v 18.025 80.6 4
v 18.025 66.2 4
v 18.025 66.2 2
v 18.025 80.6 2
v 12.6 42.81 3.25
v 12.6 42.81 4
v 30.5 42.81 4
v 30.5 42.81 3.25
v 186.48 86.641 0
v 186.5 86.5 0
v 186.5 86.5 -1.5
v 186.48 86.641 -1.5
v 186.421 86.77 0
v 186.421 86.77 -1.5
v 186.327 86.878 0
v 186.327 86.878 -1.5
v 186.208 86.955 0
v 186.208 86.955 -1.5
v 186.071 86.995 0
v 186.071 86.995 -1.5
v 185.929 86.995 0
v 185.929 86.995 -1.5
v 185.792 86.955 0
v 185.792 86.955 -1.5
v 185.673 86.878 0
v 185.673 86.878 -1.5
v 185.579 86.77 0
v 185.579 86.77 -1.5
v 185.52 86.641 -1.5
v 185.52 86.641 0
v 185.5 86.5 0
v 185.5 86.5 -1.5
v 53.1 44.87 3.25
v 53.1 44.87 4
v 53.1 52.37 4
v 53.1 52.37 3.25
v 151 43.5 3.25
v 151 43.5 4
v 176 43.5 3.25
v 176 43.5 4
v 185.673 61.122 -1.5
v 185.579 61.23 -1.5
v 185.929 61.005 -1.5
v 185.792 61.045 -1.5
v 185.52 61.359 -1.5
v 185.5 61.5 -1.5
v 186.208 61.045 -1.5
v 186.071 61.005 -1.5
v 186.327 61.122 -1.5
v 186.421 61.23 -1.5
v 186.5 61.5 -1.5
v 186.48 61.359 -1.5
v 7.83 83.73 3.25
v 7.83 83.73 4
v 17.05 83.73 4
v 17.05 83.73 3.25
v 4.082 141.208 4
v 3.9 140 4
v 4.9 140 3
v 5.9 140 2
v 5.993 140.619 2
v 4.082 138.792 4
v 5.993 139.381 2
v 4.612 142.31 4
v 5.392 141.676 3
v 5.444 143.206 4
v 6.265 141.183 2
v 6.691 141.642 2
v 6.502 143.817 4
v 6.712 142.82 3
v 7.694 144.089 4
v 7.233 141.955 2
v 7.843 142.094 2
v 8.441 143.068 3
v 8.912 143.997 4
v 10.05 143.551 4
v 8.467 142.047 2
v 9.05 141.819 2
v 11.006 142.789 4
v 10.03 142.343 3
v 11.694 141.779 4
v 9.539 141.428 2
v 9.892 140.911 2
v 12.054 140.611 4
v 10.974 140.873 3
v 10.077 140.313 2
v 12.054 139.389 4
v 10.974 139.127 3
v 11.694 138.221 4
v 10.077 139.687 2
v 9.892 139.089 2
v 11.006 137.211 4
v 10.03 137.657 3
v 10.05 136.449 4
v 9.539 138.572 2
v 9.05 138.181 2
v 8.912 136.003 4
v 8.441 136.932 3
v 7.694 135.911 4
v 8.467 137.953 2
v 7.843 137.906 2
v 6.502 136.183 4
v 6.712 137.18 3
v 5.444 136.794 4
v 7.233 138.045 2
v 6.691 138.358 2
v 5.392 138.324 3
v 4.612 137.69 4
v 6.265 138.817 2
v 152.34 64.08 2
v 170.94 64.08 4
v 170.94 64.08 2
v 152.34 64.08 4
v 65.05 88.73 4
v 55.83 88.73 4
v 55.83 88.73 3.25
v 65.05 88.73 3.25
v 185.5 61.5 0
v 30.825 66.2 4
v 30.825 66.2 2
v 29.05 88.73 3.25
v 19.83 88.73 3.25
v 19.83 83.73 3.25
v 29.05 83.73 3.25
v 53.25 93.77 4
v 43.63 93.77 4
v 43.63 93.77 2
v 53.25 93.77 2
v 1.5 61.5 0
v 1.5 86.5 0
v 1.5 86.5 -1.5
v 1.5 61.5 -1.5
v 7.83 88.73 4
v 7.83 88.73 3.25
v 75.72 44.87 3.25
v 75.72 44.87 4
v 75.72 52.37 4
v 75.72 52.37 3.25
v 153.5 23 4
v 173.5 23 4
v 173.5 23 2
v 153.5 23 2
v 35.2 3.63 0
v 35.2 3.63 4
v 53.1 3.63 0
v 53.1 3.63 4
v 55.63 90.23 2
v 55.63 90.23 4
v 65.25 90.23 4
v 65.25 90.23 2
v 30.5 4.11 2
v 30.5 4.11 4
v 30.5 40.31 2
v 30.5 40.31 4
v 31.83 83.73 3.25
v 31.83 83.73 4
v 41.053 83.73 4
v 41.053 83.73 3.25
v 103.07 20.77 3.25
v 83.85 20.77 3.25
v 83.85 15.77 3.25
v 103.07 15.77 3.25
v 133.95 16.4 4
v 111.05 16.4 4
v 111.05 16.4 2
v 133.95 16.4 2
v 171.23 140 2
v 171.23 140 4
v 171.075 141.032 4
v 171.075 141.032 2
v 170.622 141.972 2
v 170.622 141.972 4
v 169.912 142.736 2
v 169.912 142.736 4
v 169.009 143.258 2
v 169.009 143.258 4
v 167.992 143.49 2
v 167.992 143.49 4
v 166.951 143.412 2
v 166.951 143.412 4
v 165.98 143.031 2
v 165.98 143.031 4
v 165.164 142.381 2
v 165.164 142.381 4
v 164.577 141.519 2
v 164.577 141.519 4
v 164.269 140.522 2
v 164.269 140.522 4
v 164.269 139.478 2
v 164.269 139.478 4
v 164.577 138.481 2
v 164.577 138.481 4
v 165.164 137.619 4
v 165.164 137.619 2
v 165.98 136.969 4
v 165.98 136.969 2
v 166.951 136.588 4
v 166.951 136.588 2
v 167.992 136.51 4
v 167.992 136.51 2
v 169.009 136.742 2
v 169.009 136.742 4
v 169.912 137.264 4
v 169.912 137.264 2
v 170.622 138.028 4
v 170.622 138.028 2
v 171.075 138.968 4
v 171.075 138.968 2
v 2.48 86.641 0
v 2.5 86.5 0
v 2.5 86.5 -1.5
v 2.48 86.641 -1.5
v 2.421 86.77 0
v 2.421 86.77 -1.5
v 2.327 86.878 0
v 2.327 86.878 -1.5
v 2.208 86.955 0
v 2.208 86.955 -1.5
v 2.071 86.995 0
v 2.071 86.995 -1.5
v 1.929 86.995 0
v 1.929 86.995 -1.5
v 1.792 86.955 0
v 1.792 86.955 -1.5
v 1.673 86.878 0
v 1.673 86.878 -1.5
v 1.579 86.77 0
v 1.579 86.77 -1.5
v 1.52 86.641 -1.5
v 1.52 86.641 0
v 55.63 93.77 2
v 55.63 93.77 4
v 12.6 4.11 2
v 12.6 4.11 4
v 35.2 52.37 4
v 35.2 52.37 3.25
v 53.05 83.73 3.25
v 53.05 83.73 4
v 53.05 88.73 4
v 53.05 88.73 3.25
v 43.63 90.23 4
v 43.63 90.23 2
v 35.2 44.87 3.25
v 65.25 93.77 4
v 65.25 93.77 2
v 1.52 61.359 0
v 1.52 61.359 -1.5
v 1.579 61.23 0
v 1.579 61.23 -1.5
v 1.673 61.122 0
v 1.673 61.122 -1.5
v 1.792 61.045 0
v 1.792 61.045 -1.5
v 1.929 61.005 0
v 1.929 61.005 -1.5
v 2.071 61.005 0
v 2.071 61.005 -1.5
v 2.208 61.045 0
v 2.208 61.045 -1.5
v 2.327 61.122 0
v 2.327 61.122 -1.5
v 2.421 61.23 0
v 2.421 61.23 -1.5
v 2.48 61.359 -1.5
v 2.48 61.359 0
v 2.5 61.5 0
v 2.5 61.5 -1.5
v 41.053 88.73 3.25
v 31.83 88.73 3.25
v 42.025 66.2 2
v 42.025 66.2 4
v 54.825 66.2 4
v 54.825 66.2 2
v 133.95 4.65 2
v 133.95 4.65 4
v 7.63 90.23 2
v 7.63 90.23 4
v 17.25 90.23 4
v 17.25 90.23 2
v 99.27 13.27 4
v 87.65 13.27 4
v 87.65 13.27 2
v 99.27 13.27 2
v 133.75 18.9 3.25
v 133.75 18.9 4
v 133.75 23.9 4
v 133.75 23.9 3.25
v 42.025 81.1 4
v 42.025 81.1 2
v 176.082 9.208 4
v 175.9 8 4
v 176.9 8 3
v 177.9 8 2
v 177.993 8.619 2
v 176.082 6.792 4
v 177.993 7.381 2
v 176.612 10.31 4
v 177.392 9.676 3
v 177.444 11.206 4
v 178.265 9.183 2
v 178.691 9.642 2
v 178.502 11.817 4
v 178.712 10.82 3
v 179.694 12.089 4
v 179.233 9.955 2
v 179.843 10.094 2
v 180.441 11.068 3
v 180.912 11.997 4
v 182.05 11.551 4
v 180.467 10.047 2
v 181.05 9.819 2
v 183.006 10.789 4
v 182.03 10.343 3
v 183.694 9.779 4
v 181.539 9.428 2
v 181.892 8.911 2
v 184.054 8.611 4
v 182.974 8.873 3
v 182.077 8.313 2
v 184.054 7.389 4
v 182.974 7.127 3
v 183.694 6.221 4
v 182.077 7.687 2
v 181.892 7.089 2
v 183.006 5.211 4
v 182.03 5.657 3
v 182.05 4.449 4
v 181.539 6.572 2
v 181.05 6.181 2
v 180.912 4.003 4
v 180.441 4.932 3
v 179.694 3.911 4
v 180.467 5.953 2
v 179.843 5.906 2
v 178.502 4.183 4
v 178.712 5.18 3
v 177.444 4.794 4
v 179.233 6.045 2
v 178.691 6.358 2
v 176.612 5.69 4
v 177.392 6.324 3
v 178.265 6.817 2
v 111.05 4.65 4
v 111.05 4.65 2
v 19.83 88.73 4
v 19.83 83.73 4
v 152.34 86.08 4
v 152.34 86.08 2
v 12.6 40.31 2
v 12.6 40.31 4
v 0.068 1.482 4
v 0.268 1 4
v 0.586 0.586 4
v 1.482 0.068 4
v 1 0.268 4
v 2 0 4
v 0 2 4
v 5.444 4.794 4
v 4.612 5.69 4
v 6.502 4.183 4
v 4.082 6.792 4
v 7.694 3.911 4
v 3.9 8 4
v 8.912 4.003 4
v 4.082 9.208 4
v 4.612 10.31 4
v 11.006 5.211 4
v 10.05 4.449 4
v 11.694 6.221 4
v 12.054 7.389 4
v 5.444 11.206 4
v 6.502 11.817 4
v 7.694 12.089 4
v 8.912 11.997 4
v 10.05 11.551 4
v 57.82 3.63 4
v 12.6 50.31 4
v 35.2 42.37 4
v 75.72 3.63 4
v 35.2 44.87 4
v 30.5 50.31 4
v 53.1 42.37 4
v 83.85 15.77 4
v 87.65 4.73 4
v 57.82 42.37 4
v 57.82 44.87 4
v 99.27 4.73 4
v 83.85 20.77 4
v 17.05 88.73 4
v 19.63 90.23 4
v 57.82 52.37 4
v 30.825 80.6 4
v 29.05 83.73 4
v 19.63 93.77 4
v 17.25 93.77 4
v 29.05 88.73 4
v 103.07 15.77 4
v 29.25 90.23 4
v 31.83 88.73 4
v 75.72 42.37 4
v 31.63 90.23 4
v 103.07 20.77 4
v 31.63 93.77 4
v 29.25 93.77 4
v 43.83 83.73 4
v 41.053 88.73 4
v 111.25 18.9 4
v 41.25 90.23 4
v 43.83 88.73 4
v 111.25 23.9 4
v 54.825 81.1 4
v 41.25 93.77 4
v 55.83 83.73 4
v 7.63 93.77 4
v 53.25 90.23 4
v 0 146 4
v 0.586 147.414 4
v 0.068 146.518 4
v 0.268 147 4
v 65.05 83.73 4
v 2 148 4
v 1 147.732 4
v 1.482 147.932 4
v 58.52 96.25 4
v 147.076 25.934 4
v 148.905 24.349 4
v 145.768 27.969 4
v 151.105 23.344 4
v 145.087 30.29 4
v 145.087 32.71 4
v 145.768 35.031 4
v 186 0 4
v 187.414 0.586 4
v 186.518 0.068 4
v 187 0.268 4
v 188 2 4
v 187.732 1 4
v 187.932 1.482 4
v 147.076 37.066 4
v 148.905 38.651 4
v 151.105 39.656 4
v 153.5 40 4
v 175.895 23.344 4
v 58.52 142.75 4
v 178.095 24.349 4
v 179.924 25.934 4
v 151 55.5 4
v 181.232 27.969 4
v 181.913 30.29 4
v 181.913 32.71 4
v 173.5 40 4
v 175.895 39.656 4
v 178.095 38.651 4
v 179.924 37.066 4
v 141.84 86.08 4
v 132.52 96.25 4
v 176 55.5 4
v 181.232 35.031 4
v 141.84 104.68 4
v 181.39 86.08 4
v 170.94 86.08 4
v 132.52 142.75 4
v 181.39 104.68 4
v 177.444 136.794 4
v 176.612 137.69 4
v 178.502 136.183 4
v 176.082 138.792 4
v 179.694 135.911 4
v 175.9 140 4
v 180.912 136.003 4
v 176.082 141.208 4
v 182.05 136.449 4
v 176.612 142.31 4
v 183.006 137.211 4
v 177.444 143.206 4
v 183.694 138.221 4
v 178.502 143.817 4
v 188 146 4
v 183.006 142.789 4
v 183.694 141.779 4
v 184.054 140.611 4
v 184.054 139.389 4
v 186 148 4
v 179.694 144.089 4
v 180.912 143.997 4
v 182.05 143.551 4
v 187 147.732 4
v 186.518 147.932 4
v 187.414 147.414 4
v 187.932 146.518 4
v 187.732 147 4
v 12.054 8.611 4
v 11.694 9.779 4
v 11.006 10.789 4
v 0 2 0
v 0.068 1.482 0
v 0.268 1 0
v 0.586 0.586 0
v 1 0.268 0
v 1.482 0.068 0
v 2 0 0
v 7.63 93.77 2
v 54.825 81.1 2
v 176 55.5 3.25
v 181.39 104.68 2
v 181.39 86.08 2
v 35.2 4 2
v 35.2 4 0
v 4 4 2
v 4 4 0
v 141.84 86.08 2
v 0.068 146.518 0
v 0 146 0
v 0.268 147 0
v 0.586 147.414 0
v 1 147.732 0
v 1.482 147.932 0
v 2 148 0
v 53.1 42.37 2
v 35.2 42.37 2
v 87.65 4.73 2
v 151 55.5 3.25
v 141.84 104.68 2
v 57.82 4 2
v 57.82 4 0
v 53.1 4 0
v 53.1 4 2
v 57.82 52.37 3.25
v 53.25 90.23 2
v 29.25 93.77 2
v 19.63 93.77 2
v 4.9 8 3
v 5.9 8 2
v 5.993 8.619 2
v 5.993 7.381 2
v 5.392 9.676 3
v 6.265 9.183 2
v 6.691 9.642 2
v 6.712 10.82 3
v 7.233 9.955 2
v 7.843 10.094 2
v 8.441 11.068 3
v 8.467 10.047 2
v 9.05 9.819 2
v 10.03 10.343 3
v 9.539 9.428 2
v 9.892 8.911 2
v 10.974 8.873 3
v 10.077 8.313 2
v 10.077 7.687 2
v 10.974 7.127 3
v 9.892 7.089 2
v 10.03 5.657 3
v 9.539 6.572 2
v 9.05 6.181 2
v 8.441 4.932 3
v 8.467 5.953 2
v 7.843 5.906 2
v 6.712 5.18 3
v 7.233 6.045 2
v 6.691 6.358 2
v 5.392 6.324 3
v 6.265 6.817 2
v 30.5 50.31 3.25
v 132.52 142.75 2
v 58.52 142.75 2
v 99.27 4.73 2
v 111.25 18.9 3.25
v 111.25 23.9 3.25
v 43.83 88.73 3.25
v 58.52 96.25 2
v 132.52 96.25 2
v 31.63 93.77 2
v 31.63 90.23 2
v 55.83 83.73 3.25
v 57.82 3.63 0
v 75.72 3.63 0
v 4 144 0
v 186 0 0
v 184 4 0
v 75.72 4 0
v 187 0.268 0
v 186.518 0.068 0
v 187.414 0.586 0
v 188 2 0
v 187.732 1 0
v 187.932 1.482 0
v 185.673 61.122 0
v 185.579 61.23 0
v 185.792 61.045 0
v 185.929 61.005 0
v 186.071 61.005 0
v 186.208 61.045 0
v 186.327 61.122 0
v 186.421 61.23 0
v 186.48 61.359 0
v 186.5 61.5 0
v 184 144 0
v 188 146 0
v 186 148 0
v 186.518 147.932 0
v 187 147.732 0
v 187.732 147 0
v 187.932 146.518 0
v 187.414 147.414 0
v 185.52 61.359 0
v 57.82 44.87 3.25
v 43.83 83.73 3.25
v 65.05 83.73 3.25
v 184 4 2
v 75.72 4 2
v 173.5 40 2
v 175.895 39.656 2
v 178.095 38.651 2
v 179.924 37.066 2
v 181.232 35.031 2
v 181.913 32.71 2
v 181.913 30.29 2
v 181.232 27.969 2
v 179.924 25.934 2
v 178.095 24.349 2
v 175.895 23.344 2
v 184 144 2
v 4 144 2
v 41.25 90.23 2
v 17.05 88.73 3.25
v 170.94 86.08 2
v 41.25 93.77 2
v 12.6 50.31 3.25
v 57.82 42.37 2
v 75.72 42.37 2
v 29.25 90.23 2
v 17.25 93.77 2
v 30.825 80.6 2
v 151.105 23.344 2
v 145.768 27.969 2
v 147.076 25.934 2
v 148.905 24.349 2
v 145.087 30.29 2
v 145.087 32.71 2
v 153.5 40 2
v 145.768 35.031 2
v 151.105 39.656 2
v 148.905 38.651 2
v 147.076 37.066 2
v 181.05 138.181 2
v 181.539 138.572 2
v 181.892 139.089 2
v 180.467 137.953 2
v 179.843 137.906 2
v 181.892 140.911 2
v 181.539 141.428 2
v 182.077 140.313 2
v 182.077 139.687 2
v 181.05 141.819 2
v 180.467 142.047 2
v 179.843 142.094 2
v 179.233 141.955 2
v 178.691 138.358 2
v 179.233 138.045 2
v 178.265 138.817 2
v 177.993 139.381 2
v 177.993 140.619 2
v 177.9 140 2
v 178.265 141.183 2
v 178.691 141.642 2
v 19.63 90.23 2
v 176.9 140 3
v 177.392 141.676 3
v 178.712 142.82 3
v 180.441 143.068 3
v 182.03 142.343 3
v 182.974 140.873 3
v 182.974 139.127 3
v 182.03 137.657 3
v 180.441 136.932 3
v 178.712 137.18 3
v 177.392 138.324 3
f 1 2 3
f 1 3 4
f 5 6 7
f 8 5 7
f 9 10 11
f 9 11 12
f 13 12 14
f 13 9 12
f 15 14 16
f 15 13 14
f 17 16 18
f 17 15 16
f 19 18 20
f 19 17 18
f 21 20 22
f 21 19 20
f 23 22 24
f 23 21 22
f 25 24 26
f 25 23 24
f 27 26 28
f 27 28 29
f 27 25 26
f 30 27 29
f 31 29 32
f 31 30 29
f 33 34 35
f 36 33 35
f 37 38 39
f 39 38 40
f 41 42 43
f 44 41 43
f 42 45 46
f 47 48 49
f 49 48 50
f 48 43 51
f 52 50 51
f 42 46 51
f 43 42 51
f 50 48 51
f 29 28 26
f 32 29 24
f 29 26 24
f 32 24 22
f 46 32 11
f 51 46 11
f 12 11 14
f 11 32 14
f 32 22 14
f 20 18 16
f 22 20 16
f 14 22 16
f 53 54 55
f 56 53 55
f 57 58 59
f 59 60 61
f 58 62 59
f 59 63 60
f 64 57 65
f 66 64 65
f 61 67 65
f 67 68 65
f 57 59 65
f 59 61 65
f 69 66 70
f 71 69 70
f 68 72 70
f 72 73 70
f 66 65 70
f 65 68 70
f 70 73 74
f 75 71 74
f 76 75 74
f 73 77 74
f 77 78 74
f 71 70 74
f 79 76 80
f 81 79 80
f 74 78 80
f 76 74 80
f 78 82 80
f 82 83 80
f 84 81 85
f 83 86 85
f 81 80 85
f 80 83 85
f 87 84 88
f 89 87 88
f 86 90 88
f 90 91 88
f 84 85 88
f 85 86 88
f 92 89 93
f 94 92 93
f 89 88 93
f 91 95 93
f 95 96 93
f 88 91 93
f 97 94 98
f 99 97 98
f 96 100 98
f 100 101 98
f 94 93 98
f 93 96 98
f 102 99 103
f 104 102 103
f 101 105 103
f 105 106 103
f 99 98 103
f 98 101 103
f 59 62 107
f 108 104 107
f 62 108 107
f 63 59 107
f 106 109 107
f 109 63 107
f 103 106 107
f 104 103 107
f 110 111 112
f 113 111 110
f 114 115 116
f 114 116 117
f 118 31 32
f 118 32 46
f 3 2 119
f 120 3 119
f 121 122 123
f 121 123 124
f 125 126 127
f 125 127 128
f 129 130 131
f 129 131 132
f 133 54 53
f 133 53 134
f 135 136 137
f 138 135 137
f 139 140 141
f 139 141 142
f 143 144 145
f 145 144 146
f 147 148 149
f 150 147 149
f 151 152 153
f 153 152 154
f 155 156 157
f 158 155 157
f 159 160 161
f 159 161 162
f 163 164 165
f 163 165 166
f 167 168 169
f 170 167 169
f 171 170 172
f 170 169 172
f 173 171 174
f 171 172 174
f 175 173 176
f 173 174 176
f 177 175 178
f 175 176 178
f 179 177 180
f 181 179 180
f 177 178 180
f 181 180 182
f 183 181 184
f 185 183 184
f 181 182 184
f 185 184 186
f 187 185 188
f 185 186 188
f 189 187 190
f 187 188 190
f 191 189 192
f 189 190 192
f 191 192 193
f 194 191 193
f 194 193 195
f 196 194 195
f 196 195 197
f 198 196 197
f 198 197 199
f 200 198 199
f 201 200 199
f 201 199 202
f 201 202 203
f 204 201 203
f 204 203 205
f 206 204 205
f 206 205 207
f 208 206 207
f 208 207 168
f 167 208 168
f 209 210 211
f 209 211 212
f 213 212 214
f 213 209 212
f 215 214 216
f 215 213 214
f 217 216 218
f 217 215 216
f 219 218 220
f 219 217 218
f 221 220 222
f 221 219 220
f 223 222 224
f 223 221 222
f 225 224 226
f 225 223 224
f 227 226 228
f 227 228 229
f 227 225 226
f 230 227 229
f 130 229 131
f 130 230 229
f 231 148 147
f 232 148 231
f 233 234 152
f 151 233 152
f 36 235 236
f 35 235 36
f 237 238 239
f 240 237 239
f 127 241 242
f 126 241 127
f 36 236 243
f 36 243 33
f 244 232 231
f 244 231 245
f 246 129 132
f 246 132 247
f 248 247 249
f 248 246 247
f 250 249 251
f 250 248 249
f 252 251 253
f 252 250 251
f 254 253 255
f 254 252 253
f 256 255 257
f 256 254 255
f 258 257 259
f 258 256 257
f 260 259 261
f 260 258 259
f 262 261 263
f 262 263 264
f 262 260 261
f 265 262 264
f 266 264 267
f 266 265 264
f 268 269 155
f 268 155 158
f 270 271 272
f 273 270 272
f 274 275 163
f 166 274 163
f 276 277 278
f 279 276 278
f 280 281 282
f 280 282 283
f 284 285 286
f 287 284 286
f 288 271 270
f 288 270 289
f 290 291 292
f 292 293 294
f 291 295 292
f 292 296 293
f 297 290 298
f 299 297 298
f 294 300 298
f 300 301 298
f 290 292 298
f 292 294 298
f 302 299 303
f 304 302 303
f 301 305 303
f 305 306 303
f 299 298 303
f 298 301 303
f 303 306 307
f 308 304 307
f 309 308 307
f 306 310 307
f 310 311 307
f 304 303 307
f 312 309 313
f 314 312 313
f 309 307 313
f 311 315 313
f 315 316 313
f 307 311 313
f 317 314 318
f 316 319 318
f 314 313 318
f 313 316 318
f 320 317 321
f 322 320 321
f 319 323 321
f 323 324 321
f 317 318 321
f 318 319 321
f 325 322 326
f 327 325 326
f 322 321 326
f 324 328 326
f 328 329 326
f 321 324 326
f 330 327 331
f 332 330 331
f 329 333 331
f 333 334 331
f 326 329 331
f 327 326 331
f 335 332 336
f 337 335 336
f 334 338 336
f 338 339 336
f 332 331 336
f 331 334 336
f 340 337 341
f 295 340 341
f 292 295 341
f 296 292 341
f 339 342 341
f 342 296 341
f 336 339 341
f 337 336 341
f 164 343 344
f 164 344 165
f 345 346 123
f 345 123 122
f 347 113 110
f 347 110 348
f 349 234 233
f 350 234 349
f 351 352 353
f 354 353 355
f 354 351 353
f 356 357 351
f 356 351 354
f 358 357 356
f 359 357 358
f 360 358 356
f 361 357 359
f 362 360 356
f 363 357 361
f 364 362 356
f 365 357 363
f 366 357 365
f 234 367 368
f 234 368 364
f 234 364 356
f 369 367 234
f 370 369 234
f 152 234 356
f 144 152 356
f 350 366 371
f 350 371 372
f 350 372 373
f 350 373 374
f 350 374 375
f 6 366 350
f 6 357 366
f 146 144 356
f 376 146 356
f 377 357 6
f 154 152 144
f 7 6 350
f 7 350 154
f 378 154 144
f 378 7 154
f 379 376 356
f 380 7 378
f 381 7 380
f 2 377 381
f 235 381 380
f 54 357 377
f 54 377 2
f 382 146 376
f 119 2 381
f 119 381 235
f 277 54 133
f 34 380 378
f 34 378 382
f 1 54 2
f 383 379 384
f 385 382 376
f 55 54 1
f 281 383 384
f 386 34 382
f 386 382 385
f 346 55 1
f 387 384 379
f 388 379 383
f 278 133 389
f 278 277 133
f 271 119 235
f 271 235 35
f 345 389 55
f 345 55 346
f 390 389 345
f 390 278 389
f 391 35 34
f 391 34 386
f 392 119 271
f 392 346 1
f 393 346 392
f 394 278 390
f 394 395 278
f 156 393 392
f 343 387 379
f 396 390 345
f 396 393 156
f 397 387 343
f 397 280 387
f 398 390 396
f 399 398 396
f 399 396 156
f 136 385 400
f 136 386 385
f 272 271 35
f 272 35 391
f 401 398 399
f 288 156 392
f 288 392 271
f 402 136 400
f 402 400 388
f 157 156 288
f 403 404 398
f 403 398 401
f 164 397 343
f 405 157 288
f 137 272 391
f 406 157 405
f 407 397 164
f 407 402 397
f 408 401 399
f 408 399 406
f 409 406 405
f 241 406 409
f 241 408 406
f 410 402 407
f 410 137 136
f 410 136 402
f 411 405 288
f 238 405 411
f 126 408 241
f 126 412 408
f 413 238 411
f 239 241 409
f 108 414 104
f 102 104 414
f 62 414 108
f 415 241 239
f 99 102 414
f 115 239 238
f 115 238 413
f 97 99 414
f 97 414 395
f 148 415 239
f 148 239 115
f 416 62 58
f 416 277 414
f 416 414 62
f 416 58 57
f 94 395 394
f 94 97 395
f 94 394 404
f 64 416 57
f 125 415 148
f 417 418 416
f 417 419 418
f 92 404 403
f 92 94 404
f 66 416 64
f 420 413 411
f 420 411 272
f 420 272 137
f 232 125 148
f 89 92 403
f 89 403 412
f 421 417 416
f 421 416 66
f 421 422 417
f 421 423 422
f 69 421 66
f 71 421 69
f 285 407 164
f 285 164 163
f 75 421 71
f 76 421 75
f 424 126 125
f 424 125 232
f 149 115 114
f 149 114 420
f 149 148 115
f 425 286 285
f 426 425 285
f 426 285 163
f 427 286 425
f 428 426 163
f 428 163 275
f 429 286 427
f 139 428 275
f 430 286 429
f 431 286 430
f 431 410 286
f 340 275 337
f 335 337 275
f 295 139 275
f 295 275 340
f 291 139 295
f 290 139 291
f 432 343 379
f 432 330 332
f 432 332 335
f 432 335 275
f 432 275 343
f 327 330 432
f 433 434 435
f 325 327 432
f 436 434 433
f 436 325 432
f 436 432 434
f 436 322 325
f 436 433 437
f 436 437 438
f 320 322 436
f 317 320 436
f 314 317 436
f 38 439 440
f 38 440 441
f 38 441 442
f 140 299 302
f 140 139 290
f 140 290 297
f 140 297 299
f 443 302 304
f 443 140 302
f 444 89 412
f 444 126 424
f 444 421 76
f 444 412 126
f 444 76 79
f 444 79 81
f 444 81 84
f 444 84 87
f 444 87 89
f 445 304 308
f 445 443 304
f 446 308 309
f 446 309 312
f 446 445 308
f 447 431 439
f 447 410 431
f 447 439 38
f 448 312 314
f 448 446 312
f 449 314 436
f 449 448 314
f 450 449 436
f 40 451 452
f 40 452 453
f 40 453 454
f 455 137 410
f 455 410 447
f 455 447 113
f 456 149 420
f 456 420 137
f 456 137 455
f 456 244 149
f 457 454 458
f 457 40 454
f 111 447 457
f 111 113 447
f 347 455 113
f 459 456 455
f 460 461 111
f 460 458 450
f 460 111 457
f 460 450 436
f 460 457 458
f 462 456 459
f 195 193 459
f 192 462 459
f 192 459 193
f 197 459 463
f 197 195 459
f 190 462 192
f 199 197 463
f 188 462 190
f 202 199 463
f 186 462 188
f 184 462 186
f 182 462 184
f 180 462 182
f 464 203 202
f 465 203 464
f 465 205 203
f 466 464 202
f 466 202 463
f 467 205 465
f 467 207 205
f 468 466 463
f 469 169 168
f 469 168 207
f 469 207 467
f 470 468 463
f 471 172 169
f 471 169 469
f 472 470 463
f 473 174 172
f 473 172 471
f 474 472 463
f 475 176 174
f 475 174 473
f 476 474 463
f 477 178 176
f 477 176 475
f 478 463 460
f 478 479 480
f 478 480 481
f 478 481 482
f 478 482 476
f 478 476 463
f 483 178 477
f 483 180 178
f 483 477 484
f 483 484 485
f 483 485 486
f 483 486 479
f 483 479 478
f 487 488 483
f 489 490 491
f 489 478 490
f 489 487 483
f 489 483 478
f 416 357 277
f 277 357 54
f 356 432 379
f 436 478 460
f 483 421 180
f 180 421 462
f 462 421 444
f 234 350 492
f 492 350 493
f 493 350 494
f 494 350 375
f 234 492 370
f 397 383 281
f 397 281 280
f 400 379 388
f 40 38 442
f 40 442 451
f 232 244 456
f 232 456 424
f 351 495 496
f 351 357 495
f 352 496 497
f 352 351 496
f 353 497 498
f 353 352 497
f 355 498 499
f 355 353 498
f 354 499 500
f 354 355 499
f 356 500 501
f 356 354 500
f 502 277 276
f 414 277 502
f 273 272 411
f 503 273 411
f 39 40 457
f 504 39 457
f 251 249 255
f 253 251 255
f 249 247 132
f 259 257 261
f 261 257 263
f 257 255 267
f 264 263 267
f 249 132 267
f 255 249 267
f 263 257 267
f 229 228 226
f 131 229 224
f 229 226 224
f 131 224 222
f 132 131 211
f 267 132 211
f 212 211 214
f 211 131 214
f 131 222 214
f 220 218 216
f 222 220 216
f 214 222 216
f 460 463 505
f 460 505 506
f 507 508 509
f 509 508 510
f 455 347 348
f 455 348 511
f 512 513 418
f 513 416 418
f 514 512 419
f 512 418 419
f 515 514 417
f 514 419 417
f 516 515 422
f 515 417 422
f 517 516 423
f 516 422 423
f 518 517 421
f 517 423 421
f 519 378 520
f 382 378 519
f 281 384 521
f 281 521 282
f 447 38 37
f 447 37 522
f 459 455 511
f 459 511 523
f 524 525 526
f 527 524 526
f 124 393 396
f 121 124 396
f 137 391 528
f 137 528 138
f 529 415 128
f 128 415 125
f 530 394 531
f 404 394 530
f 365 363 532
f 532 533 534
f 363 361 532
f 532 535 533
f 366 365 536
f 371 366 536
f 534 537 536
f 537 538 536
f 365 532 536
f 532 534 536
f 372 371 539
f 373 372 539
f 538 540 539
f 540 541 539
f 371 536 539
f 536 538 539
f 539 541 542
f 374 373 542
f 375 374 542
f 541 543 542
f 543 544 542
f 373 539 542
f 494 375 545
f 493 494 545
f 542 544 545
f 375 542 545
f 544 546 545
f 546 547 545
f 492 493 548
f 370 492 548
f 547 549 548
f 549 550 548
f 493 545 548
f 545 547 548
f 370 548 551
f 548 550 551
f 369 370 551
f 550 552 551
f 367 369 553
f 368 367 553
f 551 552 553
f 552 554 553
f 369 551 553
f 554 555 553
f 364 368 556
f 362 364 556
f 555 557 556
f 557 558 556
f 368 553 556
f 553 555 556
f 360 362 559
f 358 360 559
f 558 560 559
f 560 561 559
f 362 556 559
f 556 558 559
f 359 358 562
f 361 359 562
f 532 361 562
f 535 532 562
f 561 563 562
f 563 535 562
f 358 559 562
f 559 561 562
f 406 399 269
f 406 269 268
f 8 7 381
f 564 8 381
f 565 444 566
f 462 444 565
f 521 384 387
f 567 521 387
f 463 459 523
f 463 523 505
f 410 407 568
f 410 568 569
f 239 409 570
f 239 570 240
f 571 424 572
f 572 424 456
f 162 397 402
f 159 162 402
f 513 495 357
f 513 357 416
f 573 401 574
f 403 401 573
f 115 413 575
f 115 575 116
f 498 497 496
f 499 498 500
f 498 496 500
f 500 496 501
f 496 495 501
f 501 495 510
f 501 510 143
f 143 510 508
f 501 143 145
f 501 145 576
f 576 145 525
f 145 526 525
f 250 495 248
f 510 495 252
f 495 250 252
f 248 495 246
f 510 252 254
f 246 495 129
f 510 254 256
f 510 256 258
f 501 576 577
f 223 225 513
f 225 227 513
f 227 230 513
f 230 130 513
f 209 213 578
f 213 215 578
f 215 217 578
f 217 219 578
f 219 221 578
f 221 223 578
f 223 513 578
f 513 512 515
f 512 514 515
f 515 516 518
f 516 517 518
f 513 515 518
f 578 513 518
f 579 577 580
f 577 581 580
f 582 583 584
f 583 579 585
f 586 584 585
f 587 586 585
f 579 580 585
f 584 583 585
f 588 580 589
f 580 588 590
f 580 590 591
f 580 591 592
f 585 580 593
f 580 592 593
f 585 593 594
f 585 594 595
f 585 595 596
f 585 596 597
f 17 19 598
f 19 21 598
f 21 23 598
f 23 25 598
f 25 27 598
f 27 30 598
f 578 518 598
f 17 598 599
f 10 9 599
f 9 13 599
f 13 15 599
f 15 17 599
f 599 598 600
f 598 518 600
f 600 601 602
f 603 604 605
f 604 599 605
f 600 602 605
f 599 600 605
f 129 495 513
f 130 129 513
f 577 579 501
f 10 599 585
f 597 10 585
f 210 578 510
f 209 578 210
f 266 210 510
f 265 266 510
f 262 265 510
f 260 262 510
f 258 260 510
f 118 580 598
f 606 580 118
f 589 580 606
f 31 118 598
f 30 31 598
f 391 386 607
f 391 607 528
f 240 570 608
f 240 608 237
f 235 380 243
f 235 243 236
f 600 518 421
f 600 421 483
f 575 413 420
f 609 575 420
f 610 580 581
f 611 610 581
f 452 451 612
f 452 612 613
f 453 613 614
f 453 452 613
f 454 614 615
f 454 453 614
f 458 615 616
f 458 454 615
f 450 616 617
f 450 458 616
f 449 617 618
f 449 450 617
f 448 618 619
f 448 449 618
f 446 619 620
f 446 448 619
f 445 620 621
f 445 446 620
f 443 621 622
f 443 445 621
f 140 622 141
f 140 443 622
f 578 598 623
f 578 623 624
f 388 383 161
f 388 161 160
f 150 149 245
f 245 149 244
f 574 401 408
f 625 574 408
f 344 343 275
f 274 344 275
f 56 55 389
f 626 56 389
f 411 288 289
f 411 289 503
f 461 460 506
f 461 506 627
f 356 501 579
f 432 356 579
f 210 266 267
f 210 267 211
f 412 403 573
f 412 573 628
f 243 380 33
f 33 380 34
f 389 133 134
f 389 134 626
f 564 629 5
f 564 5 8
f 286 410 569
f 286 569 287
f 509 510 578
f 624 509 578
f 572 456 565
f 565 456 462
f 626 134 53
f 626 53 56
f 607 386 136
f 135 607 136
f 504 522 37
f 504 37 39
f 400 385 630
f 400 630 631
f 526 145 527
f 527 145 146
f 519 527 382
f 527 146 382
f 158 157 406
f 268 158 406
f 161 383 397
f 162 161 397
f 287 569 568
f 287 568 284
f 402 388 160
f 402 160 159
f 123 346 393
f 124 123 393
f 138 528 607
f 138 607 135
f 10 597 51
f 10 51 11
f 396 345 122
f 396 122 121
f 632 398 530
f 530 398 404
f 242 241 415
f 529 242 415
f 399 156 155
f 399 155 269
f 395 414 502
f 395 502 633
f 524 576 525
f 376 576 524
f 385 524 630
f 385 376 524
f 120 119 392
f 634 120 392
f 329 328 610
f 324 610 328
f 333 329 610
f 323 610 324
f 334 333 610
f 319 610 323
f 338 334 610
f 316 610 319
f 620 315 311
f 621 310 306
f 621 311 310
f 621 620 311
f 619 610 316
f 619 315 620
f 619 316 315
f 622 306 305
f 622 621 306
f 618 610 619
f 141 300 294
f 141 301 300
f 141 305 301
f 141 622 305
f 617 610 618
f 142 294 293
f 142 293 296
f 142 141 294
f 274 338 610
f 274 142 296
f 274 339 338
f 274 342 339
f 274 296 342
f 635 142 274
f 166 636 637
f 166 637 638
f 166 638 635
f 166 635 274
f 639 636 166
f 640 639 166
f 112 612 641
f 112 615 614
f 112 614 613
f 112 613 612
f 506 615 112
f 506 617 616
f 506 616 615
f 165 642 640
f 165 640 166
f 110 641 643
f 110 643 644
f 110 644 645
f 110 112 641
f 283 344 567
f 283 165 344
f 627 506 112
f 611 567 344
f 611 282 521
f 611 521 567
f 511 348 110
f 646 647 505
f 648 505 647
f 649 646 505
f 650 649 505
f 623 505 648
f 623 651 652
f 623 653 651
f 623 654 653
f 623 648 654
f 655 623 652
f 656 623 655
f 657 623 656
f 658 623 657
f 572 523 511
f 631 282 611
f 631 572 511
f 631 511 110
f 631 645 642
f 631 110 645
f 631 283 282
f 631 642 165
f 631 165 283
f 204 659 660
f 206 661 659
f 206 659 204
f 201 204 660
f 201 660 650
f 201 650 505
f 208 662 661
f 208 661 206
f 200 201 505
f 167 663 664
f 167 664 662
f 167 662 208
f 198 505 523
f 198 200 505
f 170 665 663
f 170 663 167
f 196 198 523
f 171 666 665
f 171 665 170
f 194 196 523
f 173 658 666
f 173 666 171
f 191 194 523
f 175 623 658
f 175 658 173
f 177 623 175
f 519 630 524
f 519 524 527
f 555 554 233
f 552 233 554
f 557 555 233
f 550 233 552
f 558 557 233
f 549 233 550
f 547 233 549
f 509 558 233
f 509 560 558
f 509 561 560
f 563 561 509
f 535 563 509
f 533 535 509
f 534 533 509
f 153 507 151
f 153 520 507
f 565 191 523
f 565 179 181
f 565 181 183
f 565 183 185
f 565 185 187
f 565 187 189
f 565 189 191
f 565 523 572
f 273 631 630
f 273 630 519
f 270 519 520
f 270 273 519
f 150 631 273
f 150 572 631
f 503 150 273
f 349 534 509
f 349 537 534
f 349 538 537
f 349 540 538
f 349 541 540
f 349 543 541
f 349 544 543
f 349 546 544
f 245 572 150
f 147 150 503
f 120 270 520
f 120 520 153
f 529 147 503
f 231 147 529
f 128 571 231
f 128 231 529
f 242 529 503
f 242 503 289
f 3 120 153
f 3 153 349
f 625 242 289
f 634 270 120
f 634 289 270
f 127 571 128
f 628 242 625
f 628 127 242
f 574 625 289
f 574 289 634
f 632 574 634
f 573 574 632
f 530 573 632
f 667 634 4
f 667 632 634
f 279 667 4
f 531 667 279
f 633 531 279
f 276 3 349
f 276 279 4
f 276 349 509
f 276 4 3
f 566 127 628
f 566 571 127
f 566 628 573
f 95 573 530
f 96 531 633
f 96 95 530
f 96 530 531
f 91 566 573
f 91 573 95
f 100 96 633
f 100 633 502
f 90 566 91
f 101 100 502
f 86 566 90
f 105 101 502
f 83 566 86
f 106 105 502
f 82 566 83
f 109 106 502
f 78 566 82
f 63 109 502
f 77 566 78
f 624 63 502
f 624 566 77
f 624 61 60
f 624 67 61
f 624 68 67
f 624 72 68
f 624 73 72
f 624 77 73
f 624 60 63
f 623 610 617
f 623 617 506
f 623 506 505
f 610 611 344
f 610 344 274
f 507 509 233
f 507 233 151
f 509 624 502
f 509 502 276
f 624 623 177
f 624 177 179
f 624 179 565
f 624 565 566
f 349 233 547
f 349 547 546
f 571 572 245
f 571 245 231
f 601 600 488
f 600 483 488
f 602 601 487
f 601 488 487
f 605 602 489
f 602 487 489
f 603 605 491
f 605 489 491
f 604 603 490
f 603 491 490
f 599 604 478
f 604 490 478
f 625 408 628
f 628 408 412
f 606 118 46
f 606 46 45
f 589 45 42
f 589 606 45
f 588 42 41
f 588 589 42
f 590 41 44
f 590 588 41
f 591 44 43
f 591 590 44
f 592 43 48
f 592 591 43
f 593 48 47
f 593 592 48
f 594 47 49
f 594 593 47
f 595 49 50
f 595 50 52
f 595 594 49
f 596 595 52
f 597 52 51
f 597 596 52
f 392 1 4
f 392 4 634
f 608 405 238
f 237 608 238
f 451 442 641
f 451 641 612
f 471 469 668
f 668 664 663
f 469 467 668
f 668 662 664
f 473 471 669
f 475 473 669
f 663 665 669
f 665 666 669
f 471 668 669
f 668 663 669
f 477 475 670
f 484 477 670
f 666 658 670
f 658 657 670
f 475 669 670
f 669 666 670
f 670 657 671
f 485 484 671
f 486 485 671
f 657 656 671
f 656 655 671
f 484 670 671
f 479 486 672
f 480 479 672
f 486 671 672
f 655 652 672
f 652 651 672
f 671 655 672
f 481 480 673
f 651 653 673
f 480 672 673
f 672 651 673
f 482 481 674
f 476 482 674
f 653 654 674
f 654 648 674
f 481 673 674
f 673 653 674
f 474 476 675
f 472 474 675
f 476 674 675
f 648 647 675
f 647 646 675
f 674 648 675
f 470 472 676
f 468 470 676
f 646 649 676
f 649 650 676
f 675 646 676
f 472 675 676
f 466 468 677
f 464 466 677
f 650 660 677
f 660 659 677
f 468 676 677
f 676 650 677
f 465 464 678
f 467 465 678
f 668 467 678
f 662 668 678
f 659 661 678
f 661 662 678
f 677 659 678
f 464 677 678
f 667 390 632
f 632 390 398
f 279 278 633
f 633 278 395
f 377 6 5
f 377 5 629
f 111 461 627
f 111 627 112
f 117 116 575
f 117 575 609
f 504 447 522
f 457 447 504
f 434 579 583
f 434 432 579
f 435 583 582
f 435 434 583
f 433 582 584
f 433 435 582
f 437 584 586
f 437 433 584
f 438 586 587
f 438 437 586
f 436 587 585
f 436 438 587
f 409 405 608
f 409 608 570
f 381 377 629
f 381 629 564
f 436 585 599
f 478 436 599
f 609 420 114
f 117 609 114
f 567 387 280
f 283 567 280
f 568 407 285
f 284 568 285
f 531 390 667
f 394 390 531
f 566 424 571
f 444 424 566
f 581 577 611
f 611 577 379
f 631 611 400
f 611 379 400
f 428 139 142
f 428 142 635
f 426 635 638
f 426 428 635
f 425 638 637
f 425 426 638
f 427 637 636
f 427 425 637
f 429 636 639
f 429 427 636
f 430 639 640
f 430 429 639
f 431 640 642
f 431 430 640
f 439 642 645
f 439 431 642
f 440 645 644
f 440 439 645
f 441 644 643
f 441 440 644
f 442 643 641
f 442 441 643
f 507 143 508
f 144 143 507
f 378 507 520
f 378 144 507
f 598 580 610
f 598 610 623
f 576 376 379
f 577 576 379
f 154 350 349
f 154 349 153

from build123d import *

# Parameters (mm, degrees)
CROQUIS1_W              = 188
CROQUIS1_H              = 148
SALIENTE_EXTRUIR1_DEPTH = 4
CROQUIS2_R              = 2.1
CORTAR_EXTRUIR1_DEPTH   = 4
REDONDEO1_R             = 2
CHAFL_N1_SIZE           = 2
CORTAR_EXTRUIR4_REACH   = 6
CROQUIS4_R              = 3.5
CROQUIS4_W              = 17.9
CROQUIS4_H              = 36.2
CROQUIS4_W_2            = 9.62
CROQUIS4_H_2            = 3.54
CROQUIS4_H_3            = 38.74
CROQUIS4_W_3            = 11.62
CROQUIS4_H_4            = 8.54
CROQUIS4_W_4            = 22.9
CROQUIS4_H_5            = 11.75
CROQUIS4_W_5            = 74
CROQUIS4_H_6            = 46.5
CROQUIS4_W_6            = 12.8
CROQUIS4_H_7            = 14.4
CROQUIS4_H_8            = 14.9
CROQUIS5_W              = 180
CROQUIS5_H              = 140
CORTAR_EXTRUIR5_DEPTH   = 2
SALIENTE_EXTRUIR4_DEPTH = 1.5
CROQUIS8_W              = 17.9
CROQUIS8_H              = 7.5
CROQUIS8_W_2            = 19.22
CROQUIS8_H_2            = 5
CROQUIS8_W_3            = 22.5
CROQUIS8_W_4            = 25
CROQUIS8_H_3            = 12
CROQUIS8_W_5            = 9.22
CROQUIS8_W_6            = 9.222831243
CORTAR_EXTRUIR6_DEPTH   = 0.75


with BuildPart() as part:
    # Croquis1 → Saliente-Extruir1 (new body)
    with BuildSketch(Plane.XY):
        with Locations((94, 74)):
            Rectangle(CROQUIS1_W, CROQUIS1_H)
    extrude(amount=SALIENTE_EXTRUIR1_DEPTH)

    # Croquis2 → Cortar-Extruir1 (cut)
    with BuildSketch(Plane(origin=(0, 0, 0), x_dir=(-1, 0, 0), z_dir=(0, 0, -1))):
        with Locations((-8, 140)):
            Circle(CROQUIS2_R)
        with Locations((-180, 140)):
            Circle(CROQUIS2_R)
        with Locations((-180, 8)):
            Circle(CROQUIS2_R)
        with Locations((-8, 8)):
            Circle(CROQUIS2_R)
    extrude(amount=-CORTAR_EXTRUIR1_DEPTH, mode=Mode.SUBTRACT)

    # Redondeo1
    redondeo1_edges = [part.edges().sort_by_distance(p)[0] for p in [
        (0, 148, 2),
        (188, 148, 2),
        (188, 0, 2),
        (0, 0, 2),
    ]]
    fillet(redondeo1_edges, radius=REDONDEO1_R)

    # Chaflán1
    chafl_n1_edges = [part.edges().sort_by_distance(p)[0] for p in [
        (10.1, 8, 4),
        (182.1, 8, 4),
        (182.1, 140, 4),
        (10.1, 140, 4),
    ]]
    chamfer(chafl_n1_edges, length=CHAFL_N1_SIZE)

    # Croquis4 → Cortar-Extruir4 (cut, up to next)
    with BuildSketch(Plane.XY.offset(4), mode=Mode.PRIVATE) as cortar_extruir4_sk1:
        with Locations((167.73, 140)):
            Circle(CROQUIS4_R)
    cortar_extruir4_tool1 = extrude(cortar_extruir4_sk1.sketch, amount=-CORTAR_EXTRUIR4_REACH, mode=Mode.PRIVATE) & part.part
    add(cortar_extruir4_tool1.solids().sort_by_distance((167.73, 140, 4))[0], mode=Mode.SUBTRACT)
    # Croquis4 → Cortar-Extruir4 (cut, up to next)
    with BuildSketch(Plane.XY.offset(4), mode=Mode.PRIVATE) as cortar_extruir4_sk2:
        with Locations((21.55, 22.21)):
            Rectangle(CROQUIS4_W, CROQUIS4_H)
    cortar_extruir4_tool2 = extrude(cortar_extruir4_sk2.sketch, amount=-CORTAR_EXTRUIR4_REACH, mode=Mode.PRIVATE) & part.part
    add(cortar_extruir4_tool2.solids().sort_by_distance((21.55, 22.21, 4))[0], mode=Mode.SUBTRACT)
    # Croquis4 → Cortar-Extruir4 (cut, up to next)
    with BuildSketch(Plane.XY.offset(4), mode=Mode.PRIVATE) as cortar_extruir4_sk3:
        with Locations((36.44, 92)):
            Rectangle(CROQUIS4_W_2, CROQUIS4_H_2)
    cortar_extruir4_tool3 = extrude(cortar_extruir4_sk3.sketch, amount=-CORTAR_EXTRUIR4_REACH, mode=Mode.PRIVATE) & part.part
    add(cortar_extruir4_tool3.solids().sort_by_distance((36.44, 92, 4))[0], mode=Mode.SUBTRACT)
    # Croquis4 → Cortar-Extruir4 (cut, up to next)
    with BuildSketch(Plane.XY.offset(4), mode=Mode.PRIVATE) as cortar_extruir4_sk4:
        with Locations((44.15, 23)):
            Rectangle(CROQUIS4_W, CROQUIS4_H_3)
    cortar_extruir4_tool4 = extrude(cortar_extruir4_sk4.sketch, amount=-CORTAR_EXTRUIR4_REACH, mode=Mode.PRIVATE) & part.part
    add(cortar_extruir4_tool4.solids().sort_by_distance((44.15, 23, 4))[0], mode=Mode.SUBTRACT)
    # Croquis4 → Cortar-Extruir4 (cut, up to next)
    with BuildSketch(Plane.XY.offset(4), mode=Mode.PRIVATE) as cortar_extruir4_sk5:
        with Locations((66.77, 23)):
            Rectangle(CROQUIS4_W, CROQUIS4_H_3)
    cortar_extruir4_tool5 = extrude(cortar_extruir4_sk5.sketch, amount=-CORTAR_EXTRUIR4_REACH, mode=Mode.PRIVATE) & part.part
    add(cortar_extruir4_tool5.solids().sort_by_distance((66.77, 23, 4))[0], mode=Mode.SUBTRACT)
    # Croquis4 → Cortar-Extruir4 (cut, up to next)
    with BuildSketch(Plane.XY.offset(4), mode=Mode.PRIVATE) as cortar_extruir4_sk6:
        with Locations((93.46, 9)):
            Rectangle(CROQUIS4_W_3, CROQUIS4_H_4)
    cortar_extruir4_tool6 = extrude(cortar_extruir4_sk6.sketch, amount=-CORTAR_EXTRUIR4_REACH, mode=Mode.PRIVATE) & part.part
    add(cortar_extruir4_tool6.solids().sort_by_distance((93.46, 9, 4))[0], mode=Mode.SUBTRACT)
    # Croquis4 → Cortar-Extruir4 (cut, up to next)
    with BuildSketch(Plane.XY.offset(4), mode=Mode.PRIVATE) as cortar_extruir4_sk7:
        with Locations((122.5, 10.525)):
            Rectangle(CROQUIS4_W_4, CROQUIS4_H_5)
    cortar_extruir4_tool7 = extrude(cortar_extruir4_sk7.sketch, amount=-CORTAR_EXTRUIR4_REACH, mode=Mode.PRIVATE) & part.part
    add(cortar_extruir4_tool7.solids().sort_by_distance((122.5, 10.525, 4))[0], mode=Mode.SUBTRACT)
    # Croquis4 → Cortar-Extruir4 (cut, up to next)
    with BuildSketch(Plane.XY.offset(4), mode=Mode.PRIVATE) as cortar_extruir4_sk8:
        with Locations((12.44, 92)):
            Rectangle(CROQUIS4_W_2, CROQUIS4_H_2)
    cortar_extruir4_tool8 = extrude(cortar_extruir4_sk8.sketch, amount=-CORTAR_EXTRUIR4_REACH, mode=Mode.PRIVATE) & part.part
    add(cortar_extruir4_tool8.solids().sort_by_distance((12.44, 92, 4))[0], mode=Mode.SUBTRACT)
    # Croquis4 → Cortar-Extruir4 (cut, up to next)
    with BuildSketch(Plane.XY.offset(4), mode=Mode.PRIVATE) as cortar_extruir4_sk9:
        with Locations((48.44, 92)):
            Rectangle(CROQUIS4_W_2, CROQUIS4_H_2)
    cortar_extruir4_tool9 = extrude(cortar_extruir4_sk9.sketch, amount=-CORTAR_EXTRUIR4_REACH, mode=Mode.PRIVATE) & part.part
    add(cortar_extruir4_tool9.solids().sort_by_distance((48.44, 92, 4))[0], mode=Mode.SUBTRACT)
    # Croquis4 → Cortar-Extruir4 (cut, up to next)
    with BuildSketch(Plane.XY.offset(4), mode=Mode.PRIVATE) as cortar_extruir4_sk10:
        with Locations((24.44, 92)):
            Rectangle(CROQUIS4_W_2, CROQUIS4_H_2)
    cortar_extruir4_tool10 = extrude(cortar_extruir4_sk10.sketch, amount=-CORTAR_EXTRUIR4_REACH, mode=Mode.PRIVATE) & part.part
    add(cortar_extruir4_tool10.solids().sort_by_distance((24.44, 92, 4))[0], mode=Mode.SUBTRACT)
    # Croquis4 → Cortar-Extruir4 (cut, up to next)
    with BuildSketch(Plane.XY.offset(4), mode=Mode.PRIVATE) as cortar_extruir4_sk11:
        with Locations((60.44, 92)):
            Rectangle(CROQUIS4_W_2, CROQUIS4_H_2)
    cortar_extruir4_tool11 = extrude(cortar_extruir4_sk11.sketch, amount=-CORTAR_EXTRUIR4_REACH, mode=Mode.PRIVATE) & part.part
    add(cortar_extruir4_tool11.solids().sort_by_distance((60.44, 92, 4))[0], mode=Mode.SUBTRACT)
    # Croquis4 → Cortar-Extruir4 (cut, up to next)
    with BuildSketch(Plane.XY.offset(4), mode=Mode.PRIVATE) as cortar_extruir4_sk12:
        with Locations((95.52, 119.5)):
            Rectangle(CROQUIS4_W_5, CROQUIS4_H_6)
    cortar_extruir4_tool12 = extrude(cortar_extruir4_sk12.sketch, amount=-CORTAR_EXTRUIR4_REACH, mode=Mode.PRIVATE) & part.part
    add(cortar_extruir4_tool12.solids().sort_by_distance((95.52, 119.5, 4))[0], mode=Mode.SUBTRACT)
    # Croquis4 → Cortar-Extruir4 (cut, up to next)
    with BuildSketch(Plane.XY.offset(4), mode=Mode.PRIVATE) as cortar_extruir4_sk13:
        with Locations((24.425, 73.4)):
            Rectangle(CROQUIS4_W_6, CROQUIS4_H_7)
    cortar_extruir4_tool13 = extrude(cortar_extruir4_sk13.sketch, amount=-CORTAR_EXTRUIR4_REACH, mode=Mode.PRIVATE) & part.part
    add(cortar_extruir4_tool13.solids().sort_by_distance((24.425, 73.4, 4))[0], mode=Mode.SUBTRACT)
    # Croquis4 → Cortar-Extruir4 (cut, up to next)
    with BuildSketch(Plane.XY.offset(4), mode=Mode.PRIVATE) as cortar_extruir4_sk14:
        with Locations((48.425, 73.65)):
            Rectangle(CROQUIS4_W_6, CROQUIS4_H_8)
    cortar_extruir4_tool14 = extrude(cortar_extruir4_sk14.sketch, amount=-CORTAR_EXTRUIR4_REACH, mode=Mode.PRIVATE) & part.part
    add(cortar_extruir4_tool14.solids().sort_by_distance((48.425, 73.65, 4))[0], mode=Mode.SUBTRACT)
    # Croquis4 → Cortar-Extruir4 (cut, up to next)
    with BuildSketch(Plane.XY.offset(4), mode=Mode.PRIVATE) as cortar_extruir4_sk15:
        Polygon((141.84, 104.68), (181.39, 104.68), (181.39, 86.08), (170.94, 86.08), (170.94, 64.08), (152.34, 64.08), (152.34, 86.08), (141.84, 86.08), align=None)
    cortar_extruir4_tool15 = extrude(cortar_extruir4_sk15.sketch, amount=-CORTAR_EXTRUIR4_REACH, mode=Mode.PRIVATE) & part.part
    add(cortar_extruir4_tool15.solids().sort_by_distance((161.623936, 88.12411, 4))[0], mode=Mode.SUBTRACT)
    # Croquis4 → Cortar-Extruir4 (cut, up to next)
    with BuildSketch(Plane.XY.offset(4), mode=Mode.PRIVATE) as cortar_extruir4_sk16:
        with BuildLine():
            Line((153.5, 40), (173.5, 40))
            ThreePointArc((173.5, 40), (182, 31.5), (173.5, 23))
            Line((173.5, 23), (153.5, 23))
            ThreePointArc((153.5, 23), (145, 31.5), (153.5, 40))
        make_face()
    cortar_extruir4_tool16 = extrude(cortar_extruir4_sk16.sketch, amount=-CORTAR_EXTRUIR4_REACH, mode=Mode.PRIVATE) & part.part
    add(cortar_extruir4_tool16.solids().sort_by_distance((163.5, 31.5, 4))[0], mode=Mode.SUBTRACT)

    # Croquis5 → Cortar-Extruir5 (cut)
    with BuildSketch(Plane(origin=(0, 0, 0), x_dir=(-1, 0, 0), z_dir=(0, 0, -1))):
        with Locations((-94, 74)):
            Rectangle(CROQUIS5_W, CROQUIS5_H)
    extrude(amount=-CORTAR_EXTRUIR5_DEPTH, mode=Mode.SUBTRACT)

    # Croquis7 → Saliente-Extruir4 (add)
    with BuildSketch(Plane(origin=(0, 0, 0), x_dir=(-1, 0, 0), z_dir=(0, 0, -1))):
        with BuildLine():
            Line((-186.5, 61.5), (-186.5, 86.5))
            ThreePointArc((-186.5, 86.5), (-186, 87), (-185.5, 86.5))
            Line((-185.5, 86.5), (-185.5, 61.5))
            ThreePointArc((-185.5, 61.5), (-186, 61), (-186.5, 61.5))
        make_face()
        with BuildLine():
            Line((-2.5, 61.5), (-2.5, 86.5))
            ThreePointArc((-2.5, 86.5), (-2, 87), (-1.5, 86.5))
            Line((-1.5, 86.5), (-1.5, 61.5))
            ThreePointArc((-1.5, 61.5), (-2, 61), (-2.5, 61.5))
        make_face()
    extrude(amount=SALIENTE_EXTRUIR4_DEPTH)

    # Croquis8 → Cortar-Extruir6 (cut)
    with BuildSketch(Plane.XY.offset(4)):
        with Locations((21.55, 46.56)):
            Rectangle(CROQUIS8_W, CROQUIS8_H)
        with Locations((44.15, 48.62)):
            Rectangle(CROQUIS8_W, CROQUIS8_H)
        with Locations((66.77, 48.62)):
            Rectangle(CROQUIS8_W, CROQUIS8_H)
        with Locations((93.46, 18.27)):
            Rectangle(CROQUIS8_W_2, CROQUIS8_H_2)
        with Locations((122.5, 21.4)):
            Rectangle(CROQUIS8_W_3, CROQUIS8_H_2)
        with Locations((163.5, 49.5)):
            Rectangle(CROQUIS8_W_4, CROQUIS8_H_3)
        with Locations((12.44, 86.23)):
            Rectangle(CROQUIS8_W_5, CROQUIS8_H_2)
        with Locations((24.44, 86.23)):
            Rectangle(CROQUIS8_W_5, CROQUIS8_H_2)
        with Locations((36.441415621, 86.23)):
            Rectangle(CROQUIS8_W_6, CROQUIS8_H_2)
        with Locations((48.44, 86.23)):
            Rectangle(CROQUIS8_W_5, CROQUIS8_H_2)
        with Locations((60.44, 86.23)):
            Rectangle(CROQUIS8_W_5, CROQUIS8_H_2)
    extrude(amount=-CORTAR_EXTRUIR6_DEPTH, mode=Mode.SUBTRACT)


solid = part.part
